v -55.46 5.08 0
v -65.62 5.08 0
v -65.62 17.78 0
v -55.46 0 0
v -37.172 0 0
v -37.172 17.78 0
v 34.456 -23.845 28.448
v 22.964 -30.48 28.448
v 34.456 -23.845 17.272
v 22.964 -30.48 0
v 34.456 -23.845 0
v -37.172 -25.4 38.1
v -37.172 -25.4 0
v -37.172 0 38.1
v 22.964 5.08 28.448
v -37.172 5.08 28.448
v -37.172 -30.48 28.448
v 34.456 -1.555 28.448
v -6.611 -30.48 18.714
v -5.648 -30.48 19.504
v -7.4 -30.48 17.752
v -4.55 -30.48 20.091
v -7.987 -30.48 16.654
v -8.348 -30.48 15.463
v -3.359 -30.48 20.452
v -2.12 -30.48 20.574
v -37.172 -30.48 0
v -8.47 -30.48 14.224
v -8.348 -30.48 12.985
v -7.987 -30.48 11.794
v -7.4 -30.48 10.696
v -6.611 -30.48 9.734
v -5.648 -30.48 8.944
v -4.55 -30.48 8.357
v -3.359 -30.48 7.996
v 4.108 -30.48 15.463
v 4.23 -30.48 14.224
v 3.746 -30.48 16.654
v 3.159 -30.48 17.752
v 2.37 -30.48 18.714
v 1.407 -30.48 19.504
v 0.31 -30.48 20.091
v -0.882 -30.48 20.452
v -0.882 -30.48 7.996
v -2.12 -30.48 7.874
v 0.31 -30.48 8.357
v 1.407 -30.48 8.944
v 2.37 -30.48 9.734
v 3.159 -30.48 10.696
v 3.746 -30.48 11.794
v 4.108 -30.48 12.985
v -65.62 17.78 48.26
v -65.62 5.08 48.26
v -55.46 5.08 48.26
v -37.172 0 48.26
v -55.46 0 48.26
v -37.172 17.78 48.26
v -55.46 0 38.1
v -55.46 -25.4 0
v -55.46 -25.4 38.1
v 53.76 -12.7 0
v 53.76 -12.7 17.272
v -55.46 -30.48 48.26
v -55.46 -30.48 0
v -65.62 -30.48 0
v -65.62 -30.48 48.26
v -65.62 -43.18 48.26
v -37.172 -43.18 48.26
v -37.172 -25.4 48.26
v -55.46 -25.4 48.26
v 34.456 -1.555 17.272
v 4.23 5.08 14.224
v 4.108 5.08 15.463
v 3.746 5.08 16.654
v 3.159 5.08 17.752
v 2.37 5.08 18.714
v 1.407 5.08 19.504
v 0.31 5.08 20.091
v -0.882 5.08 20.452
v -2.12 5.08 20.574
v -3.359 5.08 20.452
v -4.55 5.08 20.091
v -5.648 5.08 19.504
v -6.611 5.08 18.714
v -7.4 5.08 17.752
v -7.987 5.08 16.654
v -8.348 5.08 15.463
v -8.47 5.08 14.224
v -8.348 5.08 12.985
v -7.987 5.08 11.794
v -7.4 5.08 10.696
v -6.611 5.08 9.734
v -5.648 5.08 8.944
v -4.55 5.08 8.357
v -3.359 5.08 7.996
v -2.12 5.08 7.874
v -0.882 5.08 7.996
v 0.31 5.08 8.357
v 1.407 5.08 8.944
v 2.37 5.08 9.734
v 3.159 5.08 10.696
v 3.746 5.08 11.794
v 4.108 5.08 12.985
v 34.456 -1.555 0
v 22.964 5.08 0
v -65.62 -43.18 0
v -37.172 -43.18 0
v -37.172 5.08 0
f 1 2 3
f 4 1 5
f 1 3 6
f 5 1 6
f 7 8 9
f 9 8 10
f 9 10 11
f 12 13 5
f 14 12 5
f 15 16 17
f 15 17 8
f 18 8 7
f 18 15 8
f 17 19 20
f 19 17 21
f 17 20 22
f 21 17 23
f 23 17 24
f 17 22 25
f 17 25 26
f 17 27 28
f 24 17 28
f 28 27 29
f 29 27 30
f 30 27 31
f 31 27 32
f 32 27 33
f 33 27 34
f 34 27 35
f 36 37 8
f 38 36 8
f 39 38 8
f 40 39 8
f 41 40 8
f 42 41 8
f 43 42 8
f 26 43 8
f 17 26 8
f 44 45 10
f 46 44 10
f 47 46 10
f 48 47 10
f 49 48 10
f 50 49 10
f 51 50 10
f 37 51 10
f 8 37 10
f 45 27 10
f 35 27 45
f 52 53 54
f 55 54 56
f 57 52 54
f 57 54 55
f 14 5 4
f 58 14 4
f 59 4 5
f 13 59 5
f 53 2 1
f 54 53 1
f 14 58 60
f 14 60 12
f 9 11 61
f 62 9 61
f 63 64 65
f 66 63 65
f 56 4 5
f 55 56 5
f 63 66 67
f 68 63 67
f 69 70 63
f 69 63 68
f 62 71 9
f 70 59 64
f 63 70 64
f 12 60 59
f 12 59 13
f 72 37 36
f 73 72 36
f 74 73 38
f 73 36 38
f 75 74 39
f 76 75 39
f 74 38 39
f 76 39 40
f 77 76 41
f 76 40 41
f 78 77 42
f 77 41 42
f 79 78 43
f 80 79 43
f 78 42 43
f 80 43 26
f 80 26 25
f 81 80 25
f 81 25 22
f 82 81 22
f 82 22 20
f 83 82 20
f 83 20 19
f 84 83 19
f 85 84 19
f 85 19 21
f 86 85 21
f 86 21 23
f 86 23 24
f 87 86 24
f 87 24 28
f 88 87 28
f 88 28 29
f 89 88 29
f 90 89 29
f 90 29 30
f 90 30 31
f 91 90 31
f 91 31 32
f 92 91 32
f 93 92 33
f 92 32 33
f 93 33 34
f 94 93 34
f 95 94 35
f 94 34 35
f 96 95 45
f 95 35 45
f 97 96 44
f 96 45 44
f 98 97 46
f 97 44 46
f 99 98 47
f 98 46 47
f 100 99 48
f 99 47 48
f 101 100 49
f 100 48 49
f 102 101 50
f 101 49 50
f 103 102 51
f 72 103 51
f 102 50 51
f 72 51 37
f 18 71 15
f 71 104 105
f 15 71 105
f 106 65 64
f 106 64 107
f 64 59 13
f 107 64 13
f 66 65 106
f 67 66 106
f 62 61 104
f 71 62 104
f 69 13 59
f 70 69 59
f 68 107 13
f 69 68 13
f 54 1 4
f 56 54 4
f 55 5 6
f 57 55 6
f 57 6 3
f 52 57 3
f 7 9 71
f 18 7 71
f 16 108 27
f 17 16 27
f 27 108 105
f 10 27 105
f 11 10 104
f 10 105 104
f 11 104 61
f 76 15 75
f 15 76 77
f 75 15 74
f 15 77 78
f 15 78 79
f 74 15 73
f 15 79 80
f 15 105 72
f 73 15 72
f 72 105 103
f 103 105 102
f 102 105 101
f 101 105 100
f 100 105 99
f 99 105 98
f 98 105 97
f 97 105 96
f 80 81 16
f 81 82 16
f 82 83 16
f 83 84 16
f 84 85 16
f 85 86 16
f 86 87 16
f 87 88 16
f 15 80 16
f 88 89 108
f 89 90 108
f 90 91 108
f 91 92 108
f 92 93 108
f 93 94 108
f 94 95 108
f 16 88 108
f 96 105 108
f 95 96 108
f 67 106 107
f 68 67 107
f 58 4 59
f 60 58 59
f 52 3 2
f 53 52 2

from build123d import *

# Parameters (mm, degrees)
F1_DEPTH = 48.26
F2_DEPTH = 38.1
F3_DEPTH = 28.448
F4_DEPTH = 17.272
F5_R     = 6.35
F6_DEPTH = 71.12


with BuildPart() as f1:
    # F0 (on Top) → F1 (new body)
    with BuildSketch(Plane.XY):
        Polygon((-37.172444715, -25.4), (-55.460444715, -25.4), (-55.460444715, -30.48), (-65.620444715, -30.48), (-65.620444715, -43.18), (-55.460444715, -43.18), (-37.172444715, -43.18), (-37.172444715, -30.48), align=None)
    extrude(amount=F1_DEPTH)


with BuildPart() as f1b:
    # F0 (on Top) → F1, piece 2 (new body)
    with BuildSketch(Plane.XY):
        Polygon((-55.460444715, 17.78), (-65.620444715, 17.78), (-65.620444715, 5.08), (-55.460444715, 5.08), (-55.460444715, 0), (-37.172444715, 0), (-37.172444715, 5.08), (-37.172444715, 17.78), align=None)
    extrude(amount=F1_DEPTH)


with BuildPart() as f2:
    # F0 (on Top) → F2 (new body)
    with BuildSketch(Plane.XY):
        Polygon((-37.172444715, 0), (-55.460444715, 0), (-55.460444715, -25.4), (-37.172444715, -25.4), (-37.172444715, -12.7), align=None)
    extrude(amount=F2_DEPTH)


with BuildPart() as f3:
    # F0 (on Top) → F3 (new body)
    with BuildSketch(Plane.XY):
        Polygon((22.9636919264, 5.08), (-37.172444715, 5.08), (-37.172444715, 0), (-37.172444715, -12.7), (-37.172444715, -25.4), (-37.172444715, -30.48), (22.9636919264, -30.48), (34.455555285, -23.8451695964), (34.455555285, -12.7), (34.455555285, -1.5548304036), align=None)
    extrude(amount=F3_DEPTH)

    # F0 (on Top) → F4 (join)
    with BuildSketch(Plane.XY):
        Polygon((53.759555285, -12.7), (34.455555285, -1.5548304036), (34.455555285, -12.7), (34.455555285, -23.8451695964), align=None)
    extrude(amount=F4_DEPTH)

    # F5 (on face) → F6 (cut)
    with BuildSketch(Plane.XZ.offset(30.48)):
        with Locations((-2.120444715, 14.224)):
            Circle(F5_R)
    extrude(amount=-F6_DEPTH, mode=Mode.SUBTRACT)


solid = Compound([f1.part, f1b.part, f2.part, f3.part])
